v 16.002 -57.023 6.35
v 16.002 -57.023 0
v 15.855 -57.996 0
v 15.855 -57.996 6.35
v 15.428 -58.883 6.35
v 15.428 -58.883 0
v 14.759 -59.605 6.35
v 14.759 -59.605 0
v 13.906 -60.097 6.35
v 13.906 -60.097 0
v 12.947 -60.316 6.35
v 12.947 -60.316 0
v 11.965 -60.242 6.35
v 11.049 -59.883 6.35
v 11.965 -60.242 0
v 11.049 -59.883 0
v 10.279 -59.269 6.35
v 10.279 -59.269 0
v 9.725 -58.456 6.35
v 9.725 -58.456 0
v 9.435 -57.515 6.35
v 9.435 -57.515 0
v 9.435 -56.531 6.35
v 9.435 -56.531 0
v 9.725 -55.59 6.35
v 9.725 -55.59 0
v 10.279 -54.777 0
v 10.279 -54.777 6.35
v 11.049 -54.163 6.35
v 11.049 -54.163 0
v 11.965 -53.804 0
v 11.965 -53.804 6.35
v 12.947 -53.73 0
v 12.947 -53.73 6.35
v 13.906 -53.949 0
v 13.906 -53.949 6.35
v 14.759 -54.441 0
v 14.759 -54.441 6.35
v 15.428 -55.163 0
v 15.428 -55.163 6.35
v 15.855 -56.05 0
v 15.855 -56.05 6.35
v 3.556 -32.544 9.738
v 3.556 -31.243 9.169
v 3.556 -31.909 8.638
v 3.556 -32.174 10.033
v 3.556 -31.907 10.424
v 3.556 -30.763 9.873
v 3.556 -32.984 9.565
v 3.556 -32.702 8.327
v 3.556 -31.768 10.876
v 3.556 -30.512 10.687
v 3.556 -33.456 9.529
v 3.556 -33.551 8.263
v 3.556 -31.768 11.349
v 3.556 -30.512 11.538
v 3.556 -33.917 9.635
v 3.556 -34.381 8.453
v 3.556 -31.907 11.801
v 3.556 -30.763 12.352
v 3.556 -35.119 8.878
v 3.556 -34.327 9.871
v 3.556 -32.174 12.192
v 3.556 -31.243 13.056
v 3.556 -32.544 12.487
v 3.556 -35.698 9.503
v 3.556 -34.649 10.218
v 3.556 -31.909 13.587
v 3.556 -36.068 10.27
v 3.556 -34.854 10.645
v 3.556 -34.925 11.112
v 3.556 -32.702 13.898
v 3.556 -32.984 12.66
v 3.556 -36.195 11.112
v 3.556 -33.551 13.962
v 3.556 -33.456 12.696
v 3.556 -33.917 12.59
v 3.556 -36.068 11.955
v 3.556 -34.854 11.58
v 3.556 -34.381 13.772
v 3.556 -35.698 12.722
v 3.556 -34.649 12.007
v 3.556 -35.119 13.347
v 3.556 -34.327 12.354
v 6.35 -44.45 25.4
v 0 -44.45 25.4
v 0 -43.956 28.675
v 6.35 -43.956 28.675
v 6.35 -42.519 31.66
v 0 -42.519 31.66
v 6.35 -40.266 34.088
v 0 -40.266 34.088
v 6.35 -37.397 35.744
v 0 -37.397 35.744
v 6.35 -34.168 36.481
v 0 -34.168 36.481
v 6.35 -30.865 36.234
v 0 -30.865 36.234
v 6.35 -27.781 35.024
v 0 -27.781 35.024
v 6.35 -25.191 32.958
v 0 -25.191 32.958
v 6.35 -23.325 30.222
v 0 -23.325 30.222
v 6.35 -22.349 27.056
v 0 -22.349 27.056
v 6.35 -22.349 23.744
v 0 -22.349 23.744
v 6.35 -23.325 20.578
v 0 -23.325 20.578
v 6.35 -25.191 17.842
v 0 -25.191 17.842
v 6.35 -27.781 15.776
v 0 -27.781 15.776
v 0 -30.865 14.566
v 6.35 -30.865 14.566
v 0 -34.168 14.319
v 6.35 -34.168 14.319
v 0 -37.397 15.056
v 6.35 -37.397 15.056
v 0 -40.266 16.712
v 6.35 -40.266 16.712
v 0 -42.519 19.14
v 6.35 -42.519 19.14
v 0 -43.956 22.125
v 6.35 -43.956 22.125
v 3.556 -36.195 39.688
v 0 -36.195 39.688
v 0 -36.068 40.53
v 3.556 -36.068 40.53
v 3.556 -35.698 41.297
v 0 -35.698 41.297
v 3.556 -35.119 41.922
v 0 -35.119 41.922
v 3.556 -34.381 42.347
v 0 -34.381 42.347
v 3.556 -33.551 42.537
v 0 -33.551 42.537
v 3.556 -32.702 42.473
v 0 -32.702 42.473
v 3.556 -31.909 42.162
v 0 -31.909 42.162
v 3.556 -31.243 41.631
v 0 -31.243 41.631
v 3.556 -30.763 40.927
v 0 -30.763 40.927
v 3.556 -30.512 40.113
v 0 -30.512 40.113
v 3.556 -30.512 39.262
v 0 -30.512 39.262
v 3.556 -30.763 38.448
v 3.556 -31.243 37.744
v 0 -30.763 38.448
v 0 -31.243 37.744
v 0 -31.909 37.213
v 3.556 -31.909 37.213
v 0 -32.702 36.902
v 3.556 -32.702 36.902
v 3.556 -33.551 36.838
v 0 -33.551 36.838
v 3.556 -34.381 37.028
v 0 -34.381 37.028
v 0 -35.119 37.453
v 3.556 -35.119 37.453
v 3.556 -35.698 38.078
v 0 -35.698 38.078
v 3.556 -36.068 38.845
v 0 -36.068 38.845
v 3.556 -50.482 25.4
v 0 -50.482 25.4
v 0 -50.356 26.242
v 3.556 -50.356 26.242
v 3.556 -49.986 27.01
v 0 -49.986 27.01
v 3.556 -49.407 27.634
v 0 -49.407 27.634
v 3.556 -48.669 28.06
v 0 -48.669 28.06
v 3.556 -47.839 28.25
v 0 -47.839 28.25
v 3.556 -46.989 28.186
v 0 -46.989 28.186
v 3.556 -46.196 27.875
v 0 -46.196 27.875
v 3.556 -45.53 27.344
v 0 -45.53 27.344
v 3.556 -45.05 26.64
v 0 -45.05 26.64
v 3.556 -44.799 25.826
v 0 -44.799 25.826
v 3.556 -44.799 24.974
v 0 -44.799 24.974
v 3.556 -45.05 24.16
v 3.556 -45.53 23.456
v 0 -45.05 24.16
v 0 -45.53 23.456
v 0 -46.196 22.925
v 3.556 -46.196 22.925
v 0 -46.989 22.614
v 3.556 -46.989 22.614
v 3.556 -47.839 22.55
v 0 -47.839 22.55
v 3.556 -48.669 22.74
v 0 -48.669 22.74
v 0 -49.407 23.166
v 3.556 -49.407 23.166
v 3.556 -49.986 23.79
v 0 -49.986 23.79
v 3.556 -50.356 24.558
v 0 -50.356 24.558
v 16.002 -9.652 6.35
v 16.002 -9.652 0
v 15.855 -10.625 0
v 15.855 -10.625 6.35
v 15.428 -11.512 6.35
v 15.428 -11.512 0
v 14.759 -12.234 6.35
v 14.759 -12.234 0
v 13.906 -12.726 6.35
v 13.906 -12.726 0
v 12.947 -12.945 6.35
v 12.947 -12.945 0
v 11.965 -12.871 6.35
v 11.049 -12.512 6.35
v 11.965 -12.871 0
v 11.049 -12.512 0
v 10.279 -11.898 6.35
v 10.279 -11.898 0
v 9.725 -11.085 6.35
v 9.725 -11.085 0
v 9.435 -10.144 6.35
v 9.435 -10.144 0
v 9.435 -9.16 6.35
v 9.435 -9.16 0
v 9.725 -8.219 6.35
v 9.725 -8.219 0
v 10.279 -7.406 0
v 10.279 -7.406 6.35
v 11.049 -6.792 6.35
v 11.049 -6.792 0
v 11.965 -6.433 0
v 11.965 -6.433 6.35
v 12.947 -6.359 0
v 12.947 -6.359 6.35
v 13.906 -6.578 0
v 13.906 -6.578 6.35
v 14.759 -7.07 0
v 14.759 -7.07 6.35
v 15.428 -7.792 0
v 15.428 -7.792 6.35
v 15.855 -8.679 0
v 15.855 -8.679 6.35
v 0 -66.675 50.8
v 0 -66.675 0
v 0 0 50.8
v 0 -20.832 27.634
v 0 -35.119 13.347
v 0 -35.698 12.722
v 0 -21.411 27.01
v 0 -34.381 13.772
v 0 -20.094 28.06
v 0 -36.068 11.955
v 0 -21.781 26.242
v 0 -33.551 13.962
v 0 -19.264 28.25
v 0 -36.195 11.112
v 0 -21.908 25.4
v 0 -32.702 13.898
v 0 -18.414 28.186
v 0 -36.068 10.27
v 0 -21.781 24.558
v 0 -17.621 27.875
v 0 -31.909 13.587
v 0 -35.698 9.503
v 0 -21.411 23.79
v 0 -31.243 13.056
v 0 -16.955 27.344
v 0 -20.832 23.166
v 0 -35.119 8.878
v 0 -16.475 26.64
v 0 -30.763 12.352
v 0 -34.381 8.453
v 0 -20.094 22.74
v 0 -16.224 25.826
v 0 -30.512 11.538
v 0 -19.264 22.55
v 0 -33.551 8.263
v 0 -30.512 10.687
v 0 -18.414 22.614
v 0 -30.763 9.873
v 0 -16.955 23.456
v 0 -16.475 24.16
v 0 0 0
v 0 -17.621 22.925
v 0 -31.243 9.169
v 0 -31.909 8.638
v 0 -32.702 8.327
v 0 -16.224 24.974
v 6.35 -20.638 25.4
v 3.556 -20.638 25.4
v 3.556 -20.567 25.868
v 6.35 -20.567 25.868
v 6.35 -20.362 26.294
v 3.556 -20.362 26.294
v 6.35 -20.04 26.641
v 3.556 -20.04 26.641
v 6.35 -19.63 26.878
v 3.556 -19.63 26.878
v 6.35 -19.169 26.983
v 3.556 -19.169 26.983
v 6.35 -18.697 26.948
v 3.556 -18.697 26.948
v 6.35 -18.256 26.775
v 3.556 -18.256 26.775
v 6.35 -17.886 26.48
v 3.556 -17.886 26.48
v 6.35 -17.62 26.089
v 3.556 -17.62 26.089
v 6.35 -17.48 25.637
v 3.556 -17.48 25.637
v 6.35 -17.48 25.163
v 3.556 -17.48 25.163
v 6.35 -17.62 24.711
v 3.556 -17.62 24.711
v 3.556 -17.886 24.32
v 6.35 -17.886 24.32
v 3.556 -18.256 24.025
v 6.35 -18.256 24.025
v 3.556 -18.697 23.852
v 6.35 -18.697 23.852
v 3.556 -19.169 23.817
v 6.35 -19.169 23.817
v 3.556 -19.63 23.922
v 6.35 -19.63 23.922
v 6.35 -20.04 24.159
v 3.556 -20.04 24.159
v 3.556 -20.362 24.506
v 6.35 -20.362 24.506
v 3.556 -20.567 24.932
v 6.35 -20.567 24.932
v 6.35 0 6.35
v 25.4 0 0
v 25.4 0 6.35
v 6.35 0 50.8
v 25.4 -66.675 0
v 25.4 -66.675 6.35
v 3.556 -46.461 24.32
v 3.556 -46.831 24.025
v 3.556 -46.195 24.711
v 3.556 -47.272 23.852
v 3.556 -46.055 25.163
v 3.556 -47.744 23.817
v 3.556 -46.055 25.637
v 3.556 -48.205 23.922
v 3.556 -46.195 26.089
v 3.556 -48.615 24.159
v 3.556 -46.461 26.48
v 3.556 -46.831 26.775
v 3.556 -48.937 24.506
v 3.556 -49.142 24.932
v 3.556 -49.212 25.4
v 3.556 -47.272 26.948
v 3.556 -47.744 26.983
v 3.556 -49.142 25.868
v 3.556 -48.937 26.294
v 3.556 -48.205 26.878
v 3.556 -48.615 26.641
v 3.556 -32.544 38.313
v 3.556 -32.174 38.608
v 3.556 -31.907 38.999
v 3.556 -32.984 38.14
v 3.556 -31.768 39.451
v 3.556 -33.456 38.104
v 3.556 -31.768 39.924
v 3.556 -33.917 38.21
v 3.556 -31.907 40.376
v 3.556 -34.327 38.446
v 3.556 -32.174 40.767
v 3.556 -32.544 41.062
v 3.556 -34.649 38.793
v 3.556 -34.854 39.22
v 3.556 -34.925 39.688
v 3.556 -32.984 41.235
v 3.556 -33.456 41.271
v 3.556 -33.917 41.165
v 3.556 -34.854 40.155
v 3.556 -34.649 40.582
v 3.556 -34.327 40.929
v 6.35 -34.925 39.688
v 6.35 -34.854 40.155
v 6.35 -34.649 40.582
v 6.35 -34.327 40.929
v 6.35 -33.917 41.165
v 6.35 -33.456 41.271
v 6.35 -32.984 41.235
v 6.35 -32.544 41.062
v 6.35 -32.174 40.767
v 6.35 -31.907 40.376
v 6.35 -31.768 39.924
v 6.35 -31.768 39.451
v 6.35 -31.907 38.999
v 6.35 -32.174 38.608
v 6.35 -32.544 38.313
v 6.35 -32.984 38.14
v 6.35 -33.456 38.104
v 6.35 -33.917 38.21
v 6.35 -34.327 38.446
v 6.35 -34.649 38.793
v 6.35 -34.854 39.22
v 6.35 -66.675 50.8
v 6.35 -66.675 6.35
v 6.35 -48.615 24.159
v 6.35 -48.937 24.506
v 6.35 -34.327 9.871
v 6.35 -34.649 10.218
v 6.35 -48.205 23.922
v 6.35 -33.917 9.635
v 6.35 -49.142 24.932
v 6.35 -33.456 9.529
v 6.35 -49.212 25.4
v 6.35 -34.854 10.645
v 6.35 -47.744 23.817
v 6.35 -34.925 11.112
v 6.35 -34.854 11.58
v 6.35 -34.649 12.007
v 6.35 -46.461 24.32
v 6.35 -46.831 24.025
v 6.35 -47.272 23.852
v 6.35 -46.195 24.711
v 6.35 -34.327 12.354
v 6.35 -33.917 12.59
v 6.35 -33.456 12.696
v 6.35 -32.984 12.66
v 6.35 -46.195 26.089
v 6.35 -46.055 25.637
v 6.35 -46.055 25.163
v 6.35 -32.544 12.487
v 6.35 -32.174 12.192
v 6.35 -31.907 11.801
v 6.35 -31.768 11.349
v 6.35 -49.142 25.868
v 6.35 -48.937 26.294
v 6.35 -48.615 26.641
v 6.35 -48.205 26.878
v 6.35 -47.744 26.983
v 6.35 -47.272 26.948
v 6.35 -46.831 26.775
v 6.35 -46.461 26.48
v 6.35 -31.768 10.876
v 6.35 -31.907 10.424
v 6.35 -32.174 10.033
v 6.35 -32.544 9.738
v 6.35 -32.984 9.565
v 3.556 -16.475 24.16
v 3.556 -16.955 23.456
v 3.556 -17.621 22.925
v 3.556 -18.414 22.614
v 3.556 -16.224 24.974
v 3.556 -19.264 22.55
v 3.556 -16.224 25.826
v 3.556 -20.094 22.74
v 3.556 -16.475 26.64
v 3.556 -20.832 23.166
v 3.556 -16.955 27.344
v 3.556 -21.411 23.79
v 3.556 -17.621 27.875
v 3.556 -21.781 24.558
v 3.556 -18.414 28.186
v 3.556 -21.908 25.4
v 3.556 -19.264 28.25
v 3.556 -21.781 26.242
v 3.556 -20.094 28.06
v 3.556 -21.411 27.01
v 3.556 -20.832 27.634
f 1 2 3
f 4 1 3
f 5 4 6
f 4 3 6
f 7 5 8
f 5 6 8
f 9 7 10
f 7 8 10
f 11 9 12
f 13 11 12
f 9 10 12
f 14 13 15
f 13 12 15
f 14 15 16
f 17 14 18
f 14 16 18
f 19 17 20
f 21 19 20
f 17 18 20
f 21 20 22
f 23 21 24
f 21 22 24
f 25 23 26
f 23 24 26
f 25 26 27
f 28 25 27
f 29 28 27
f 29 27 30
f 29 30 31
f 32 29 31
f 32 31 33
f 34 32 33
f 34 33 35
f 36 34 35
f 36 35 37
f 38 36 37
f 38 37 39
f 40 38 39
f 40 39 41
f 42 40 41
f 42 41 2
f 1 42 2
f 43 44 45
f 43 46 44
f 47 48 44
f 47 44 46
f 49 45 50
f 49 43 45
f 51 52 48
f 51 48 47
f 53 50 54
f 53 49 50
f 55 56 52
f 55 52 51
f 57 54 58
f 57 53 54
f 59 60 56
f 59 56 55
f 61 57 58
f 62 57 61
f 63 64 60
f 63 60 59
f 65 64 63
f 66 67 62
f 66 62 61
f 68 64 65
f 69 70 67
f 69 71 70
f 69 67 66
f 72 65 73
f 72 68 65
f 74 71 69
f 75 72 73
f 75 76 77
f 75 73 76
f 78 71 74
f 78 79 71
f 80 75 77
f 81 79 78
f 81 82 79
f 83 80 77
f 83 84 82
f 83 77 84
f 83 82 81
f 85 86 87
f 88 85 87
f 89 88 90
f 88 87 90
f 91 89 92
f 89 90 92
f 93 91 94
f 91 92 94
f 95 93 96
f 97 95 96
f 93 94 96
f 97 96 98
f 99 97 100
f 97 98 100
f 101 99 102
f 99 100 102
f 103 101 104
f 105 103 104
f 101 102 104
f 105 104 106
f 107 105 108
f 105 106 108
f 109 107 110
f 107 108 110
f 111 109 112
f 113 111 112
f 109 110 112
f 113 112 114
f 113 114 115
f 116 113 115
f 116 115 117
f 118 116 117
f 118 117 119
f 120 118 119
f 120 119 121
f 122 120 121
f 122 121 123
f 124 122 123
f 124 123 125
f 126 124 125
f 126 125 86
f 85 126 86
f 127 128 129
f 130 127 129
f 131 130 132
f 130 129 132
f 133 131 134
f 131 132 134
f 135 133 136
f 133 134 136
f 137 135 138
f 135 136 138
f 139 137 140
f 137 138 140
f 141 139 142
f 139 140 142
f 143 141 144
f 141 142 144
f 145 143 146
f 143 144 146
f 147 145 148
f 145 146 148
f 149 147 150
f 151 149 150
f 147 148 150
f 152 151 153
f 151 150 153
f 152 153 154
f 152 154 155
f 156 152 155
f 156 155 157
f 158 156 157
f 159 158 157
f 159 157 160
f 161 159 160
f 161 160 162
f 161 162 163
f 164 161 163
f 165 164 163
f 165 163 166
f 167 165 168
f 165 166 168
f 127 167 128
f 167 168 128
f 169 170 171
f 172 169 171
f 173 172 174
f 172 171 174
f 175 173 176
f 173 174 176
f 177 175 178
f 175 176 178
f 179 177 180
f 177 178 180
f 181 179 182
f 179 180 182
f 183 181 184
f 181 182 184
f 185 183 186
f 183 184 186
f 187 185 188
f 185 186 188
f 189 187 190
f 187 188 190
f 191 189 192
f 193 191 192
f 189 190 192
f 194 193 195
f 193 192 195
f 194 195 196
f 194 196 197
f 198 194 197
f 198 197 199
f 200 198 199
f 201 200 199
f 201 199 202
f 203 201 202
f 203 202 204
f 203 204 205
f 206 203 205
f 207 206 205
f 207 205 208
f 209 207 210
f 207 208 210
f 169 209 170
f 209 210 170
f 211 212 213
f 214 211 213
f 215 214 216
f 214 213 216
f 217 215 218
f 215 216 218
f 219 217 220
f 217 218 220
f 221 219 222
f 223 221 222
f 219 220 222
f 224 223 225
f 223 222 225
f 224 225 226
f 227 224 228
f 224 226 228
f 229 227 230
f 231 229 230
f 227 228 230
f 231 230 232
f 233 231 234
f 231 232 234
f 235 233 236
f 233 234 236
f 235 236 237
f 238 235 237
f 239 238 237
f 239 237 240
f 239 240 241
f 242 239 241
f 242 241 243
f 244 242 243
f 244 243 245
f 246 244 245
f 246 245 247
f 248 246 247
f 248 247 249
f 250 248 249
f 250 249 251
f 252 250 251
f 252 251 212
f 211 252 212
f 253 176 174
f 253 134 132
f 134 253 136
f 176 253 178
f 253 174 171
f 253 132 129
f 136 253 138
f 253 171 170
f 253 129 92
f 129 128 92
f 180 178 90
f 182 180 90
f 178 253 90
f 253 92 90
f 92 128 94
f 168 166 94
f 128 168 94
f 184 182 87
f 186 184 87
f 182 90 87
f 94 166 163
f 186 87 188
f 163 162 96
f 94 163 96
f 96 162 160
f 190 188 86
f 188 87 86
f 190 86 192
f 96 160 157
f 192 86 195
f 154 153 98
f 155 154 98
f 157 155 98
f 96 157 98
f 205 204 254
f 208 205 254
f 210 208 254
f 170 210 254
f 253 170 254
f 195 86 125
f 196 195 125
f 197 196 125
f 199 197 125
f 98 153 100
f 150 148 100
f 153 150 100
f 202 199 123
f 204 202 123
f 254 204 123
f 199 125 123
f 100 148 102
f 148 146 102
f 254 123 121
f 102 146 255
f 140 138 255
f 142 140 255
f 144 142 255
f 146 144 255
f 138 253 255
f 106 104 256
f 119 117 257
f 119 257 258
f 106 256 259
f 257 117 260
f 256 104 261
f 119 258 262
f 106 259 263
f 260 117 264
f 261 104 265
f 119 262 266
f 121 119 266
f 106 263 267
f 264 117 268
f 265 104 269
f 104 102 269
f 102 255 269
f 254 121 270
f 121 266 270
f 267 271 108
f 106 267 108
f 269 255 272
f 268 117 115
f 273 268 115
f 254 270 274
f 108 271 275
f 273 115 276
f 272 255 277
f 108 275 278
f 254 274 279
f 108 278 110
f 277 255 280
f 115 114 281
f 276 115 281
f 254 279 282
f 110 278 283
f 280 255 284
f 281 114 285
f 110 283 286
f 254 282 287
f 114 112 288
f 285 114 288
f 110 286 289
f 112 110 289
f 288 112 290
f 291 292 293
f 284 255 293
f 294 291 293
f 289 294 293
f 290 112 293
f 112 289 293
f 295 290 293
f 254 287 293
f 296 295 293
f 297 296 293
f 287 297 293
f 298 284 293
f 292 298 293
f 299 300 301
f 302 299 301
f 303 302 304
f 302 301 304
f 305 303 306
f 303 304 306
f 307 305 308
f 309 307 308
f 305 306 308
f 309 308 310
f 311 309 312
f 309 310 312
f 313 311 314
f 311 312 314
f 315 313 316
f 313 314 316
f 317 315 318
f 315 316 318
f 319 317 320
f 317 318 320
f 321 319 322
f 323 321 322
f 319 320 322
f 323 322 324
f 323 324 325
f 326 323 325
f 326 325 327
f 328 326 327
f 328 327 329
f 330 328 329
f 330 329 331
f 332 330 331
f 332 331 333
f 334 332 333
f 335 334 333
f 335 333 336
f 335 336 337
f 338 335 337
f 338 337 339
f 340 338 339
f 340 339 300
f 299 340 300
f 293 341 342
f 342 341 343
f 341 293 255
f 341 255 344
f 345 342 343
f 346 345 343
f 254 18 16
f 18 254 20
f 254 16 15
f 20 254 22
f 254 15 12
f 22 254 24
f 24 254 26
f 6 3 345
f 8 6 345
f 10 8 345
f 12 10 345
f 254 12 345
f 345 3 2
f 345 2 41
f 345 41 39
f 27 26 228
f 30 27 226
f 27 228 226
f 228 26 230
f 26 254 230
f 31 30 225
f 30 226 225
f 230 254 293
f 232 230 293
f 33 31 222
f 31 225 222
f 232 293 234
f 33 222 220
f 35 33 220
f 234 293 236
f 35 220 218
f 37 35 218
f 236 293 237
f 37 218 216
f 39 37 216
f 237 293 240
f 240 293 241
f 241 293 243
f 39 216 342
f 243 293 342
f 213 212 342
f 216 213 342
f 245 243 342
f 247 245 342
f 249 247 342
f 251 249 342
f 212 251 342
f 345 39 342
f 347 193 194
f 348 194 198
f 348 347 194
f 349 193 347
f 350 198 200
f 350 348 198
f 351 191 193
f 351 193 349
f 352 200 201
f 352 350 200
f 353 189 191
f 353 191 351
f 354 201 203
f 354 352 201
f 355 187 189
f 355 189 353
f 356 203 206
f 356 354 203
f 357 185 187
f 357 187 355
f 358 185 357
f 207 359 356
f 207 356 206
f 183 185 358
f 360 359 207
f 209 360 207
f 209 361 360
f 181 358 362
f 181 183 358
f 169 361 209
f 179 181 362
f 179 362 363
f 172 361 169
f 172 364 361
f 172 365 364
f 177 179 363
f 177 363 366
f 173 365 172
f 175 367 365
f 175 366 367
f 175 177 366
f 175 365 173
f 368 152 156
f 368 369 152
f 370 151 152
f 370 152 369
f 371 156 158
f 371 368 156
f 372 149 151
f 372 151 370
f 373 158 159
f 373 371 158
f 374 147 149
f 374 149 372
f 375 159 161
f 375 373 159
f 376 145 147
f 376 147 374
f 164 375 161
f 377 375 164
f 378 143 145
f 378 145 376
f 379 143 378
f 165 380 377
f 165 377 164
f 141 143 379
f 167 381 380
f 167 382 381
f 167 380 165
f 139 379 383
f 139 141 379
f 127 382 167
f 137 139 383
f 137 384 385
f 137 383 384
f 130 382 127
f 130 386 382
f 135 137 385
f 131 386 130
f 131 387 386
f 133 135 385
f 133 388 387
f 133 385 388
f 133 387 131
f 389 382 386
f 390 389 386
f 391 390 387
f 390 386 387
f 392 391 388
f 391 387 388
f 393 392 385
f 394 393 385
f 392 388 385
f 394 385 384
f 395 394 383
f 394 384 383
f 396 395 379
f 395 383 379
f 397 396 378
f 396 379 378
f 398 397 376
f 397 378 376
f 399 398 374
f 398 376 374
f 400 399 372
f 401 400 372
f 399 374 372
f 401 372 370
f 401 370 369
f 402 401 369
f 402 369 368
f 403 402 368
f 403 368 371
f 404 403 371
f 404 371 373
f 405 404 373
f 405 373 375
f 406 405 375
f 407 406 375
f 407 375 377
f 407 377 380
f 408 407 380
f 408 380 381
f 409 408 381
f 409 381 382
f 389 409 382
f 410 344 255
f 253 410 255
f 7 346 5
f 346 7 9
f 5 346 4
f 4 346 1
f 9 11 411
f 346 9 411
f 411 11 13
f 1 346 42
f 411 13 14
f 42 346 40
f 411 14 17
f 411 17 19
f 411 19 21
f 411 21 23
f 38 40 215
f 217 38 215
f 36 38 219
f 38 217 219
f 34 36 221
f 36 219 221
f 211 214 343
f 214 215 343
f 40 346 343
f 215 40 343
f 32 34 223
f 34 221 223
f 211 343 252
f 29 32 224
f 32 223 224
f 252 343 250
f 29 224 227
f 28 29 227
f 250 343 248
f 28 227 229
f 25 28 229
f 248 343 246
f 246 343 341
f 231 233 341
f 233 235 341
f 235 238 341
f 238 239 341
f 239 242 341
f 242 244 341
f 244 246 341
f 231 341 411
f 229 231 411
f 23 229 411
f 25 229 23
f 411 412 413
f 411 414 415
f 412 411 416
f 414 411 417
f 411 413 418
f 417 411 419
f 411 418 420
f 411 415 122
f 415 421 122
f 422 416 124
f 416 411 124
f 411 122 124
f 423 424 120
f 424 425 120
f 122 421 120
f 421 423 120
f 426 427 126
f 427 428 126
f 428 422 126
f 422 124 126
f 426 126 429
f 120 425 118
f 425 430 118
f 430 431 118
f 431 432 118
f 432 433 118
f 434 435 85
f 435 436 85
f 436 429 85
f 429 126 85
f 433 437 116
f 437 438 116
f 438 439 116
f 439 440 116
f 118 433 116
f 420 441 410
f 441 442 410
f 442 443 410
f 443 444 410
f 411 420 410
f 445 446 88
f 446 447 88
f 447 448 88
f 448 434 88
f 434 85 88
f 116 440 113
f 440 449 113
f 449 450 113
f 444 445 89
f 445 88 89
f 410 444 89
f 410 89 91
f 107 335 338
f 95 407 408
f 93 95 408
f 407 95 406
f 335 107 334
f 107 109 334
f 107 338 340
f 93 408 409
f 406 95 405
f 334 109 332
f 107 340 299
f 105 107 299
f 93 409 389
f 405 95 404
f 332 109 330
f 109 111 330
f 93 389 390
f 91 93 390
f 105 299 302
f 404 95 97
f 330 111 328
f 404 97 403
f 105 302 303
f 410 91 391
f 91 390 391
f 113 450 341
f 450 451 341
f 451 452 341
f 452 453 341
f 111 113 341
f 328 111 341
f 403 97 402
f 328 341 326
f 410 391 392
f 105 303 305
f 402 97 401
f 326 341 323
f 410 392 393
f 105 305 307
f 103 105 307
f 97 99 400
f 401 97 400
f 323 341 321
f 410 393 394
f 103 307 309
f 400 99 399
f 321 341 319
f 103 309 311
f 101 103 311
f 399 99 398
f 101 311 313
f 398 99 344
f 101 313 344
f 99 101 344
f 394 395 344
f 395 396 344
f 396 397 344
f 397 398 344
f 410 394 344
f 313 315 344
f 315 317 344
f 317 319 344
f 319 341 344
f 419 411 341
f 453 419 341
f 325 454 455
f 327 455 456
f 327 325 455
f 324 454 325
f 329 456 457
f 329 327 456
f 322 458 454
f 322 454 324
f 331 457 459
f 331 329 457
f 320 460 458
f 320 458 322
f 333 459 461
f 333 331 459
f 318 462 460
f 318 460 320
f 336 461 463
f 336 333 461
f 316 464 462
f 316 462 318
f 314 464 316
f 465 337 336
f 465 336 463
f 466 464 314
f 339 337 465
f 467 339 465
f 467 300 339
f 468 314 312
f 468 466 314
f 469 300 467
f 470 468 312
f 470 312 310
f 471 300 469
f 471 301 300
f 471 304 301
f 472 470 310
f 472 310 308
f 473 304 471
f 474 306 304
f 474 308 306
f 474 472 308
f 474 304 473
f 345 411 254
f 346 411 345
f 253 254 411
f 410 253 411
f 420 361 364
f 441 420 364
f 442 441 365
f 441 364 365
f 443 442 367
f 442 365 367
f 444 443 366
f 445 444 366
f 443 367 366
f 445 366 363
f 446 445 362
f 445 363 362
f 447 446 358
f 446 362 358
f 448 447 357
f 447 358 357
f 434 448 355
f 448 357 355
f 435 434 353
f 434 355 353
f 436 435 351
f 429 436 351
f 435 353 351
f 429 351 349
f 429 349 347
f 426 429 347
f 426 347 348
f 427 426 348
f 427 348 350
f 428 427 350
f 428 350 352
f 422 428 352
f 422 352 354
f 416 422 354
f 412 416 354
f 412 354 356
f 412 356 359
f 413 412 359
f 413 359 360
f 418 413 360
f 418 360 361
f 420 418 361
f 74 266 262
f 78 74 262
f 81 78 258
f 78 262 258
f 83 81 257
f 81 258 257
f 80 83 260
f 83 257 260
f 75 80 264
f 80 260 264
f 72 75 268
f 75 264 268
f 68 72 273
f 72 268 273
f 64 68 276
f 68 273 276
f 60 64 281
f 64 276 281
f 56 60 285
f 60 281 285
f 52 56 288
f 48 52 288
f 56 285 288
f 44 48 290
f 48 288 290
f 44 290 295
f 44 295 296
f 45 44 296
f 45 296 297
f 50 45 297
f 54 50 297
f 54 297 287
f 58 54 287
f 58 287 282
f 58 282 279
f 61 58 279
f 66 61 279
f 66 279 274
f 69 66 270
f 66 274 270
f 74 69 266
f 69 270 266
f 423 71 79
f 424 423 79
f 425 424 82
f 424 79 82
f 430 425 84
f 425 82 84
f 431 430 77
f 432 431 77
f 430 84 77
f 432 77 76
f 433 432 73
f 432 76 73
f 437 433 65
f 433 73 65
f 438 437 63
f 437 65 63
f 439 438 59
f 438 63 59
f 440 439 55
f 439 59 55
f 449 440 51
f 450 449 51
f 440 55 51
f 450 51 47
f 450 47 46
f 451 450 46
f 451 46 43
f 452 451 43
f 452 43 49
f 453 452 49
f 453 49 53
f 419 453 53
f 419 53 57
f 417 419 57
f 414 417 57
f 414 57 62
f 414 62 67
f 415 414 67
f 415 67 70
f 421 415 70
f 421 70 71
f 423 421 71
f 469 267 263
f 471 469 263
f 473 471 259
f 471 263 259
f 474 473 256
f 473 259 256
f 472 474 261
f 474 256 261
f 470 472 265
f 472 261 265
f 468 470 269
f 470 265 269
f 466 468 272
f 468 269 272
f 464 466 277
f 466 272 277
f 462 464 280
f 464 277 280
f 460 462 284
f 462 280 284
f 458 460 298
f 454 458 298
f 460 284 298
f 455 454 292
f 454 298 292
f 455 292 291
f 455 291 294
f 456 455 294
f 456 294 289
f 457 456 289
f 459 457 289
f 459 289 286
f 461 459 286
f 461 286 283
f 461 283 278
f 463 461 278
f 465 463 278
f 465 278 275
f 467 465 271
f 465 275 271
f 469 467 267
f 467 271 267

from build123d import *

# Parameters (mm, degrees)
F1_DEPTH = 66.675
F2_R     = 1.5875
F2_R_2   = 11.1125
F3_DEPTH = 25.401
F4_R     = 2.8575
F5_DEPTH = 3.556
F6_R     = 3.302
F7_DEPTH = 50.801


with BuildPart() as f1:
    # F0 (on Front) → F1 (new body)
    with BuildSketch(Plane.XZ):
        Polygon((0, 50.8), (0, 0), (25.4, 0), (25.4, 6.35), (6.35, 6.35), (6.35, 50.8), align=None)
    extrude(amount=F1_DEPTH)

    # F2 (on face) → F3 (cut, through all)
    with BuildSketch(Plane(origin=(0, 0, 0), x_dir=(0, -1, 0), z_dir=(-1, 0, 0))):
        with Locations((19.05, 25.4)):
            Circle(F2_R)
        with Locations((33.3375, 39.6875)):
            Circle(F2_R)
        with Locations((33.3375, 25.4)):
            Circle(F2_R_2)
        with Locations((47.625, 25.4)):
            Circle(F2_R)
        with Locations((33.3375, 11.1125)):
            Circle(F2_R)
    extrude(amount=-F3_DEPTH, mode=Mode.SUBTRACT)

    # F4 (on face) → F5 (cut)
    with BuildSketch(Plane(origin=(0, 0, 0), x_dir=(0, -1, 0), z_dir=(-1, 0, 0))):
        with Locations((33.3375, 39.6875)):
            Circle(F4_R)
        with Locations((47.625, 25.4)):
            Circle(F4_R)
        with Locations((33.3375, 11.1125)):
            Circle(F4_R)
        with Locations((19.05, 25.4)):
            Circle(F4_R)
    extrude(amount=-F5_DEPTH, mode=Mode.SUBTRACT)

    # F6 (on face) → F7 (cut, through all)
    with BuildSketch(Plane(origin=(0, 0, 0), x_dir=(1, 0, 0), z_dir=(0, 0, -1))):
        with Locations((12.7, 9.652)):
            Circle(F6_R)
        with Locations((12.7, 57.023)):
            Circle(F6_R)
    extrude(amount=-F7_DEPTH, mode=Mode.SUBTRACT)


solid = f1.part
